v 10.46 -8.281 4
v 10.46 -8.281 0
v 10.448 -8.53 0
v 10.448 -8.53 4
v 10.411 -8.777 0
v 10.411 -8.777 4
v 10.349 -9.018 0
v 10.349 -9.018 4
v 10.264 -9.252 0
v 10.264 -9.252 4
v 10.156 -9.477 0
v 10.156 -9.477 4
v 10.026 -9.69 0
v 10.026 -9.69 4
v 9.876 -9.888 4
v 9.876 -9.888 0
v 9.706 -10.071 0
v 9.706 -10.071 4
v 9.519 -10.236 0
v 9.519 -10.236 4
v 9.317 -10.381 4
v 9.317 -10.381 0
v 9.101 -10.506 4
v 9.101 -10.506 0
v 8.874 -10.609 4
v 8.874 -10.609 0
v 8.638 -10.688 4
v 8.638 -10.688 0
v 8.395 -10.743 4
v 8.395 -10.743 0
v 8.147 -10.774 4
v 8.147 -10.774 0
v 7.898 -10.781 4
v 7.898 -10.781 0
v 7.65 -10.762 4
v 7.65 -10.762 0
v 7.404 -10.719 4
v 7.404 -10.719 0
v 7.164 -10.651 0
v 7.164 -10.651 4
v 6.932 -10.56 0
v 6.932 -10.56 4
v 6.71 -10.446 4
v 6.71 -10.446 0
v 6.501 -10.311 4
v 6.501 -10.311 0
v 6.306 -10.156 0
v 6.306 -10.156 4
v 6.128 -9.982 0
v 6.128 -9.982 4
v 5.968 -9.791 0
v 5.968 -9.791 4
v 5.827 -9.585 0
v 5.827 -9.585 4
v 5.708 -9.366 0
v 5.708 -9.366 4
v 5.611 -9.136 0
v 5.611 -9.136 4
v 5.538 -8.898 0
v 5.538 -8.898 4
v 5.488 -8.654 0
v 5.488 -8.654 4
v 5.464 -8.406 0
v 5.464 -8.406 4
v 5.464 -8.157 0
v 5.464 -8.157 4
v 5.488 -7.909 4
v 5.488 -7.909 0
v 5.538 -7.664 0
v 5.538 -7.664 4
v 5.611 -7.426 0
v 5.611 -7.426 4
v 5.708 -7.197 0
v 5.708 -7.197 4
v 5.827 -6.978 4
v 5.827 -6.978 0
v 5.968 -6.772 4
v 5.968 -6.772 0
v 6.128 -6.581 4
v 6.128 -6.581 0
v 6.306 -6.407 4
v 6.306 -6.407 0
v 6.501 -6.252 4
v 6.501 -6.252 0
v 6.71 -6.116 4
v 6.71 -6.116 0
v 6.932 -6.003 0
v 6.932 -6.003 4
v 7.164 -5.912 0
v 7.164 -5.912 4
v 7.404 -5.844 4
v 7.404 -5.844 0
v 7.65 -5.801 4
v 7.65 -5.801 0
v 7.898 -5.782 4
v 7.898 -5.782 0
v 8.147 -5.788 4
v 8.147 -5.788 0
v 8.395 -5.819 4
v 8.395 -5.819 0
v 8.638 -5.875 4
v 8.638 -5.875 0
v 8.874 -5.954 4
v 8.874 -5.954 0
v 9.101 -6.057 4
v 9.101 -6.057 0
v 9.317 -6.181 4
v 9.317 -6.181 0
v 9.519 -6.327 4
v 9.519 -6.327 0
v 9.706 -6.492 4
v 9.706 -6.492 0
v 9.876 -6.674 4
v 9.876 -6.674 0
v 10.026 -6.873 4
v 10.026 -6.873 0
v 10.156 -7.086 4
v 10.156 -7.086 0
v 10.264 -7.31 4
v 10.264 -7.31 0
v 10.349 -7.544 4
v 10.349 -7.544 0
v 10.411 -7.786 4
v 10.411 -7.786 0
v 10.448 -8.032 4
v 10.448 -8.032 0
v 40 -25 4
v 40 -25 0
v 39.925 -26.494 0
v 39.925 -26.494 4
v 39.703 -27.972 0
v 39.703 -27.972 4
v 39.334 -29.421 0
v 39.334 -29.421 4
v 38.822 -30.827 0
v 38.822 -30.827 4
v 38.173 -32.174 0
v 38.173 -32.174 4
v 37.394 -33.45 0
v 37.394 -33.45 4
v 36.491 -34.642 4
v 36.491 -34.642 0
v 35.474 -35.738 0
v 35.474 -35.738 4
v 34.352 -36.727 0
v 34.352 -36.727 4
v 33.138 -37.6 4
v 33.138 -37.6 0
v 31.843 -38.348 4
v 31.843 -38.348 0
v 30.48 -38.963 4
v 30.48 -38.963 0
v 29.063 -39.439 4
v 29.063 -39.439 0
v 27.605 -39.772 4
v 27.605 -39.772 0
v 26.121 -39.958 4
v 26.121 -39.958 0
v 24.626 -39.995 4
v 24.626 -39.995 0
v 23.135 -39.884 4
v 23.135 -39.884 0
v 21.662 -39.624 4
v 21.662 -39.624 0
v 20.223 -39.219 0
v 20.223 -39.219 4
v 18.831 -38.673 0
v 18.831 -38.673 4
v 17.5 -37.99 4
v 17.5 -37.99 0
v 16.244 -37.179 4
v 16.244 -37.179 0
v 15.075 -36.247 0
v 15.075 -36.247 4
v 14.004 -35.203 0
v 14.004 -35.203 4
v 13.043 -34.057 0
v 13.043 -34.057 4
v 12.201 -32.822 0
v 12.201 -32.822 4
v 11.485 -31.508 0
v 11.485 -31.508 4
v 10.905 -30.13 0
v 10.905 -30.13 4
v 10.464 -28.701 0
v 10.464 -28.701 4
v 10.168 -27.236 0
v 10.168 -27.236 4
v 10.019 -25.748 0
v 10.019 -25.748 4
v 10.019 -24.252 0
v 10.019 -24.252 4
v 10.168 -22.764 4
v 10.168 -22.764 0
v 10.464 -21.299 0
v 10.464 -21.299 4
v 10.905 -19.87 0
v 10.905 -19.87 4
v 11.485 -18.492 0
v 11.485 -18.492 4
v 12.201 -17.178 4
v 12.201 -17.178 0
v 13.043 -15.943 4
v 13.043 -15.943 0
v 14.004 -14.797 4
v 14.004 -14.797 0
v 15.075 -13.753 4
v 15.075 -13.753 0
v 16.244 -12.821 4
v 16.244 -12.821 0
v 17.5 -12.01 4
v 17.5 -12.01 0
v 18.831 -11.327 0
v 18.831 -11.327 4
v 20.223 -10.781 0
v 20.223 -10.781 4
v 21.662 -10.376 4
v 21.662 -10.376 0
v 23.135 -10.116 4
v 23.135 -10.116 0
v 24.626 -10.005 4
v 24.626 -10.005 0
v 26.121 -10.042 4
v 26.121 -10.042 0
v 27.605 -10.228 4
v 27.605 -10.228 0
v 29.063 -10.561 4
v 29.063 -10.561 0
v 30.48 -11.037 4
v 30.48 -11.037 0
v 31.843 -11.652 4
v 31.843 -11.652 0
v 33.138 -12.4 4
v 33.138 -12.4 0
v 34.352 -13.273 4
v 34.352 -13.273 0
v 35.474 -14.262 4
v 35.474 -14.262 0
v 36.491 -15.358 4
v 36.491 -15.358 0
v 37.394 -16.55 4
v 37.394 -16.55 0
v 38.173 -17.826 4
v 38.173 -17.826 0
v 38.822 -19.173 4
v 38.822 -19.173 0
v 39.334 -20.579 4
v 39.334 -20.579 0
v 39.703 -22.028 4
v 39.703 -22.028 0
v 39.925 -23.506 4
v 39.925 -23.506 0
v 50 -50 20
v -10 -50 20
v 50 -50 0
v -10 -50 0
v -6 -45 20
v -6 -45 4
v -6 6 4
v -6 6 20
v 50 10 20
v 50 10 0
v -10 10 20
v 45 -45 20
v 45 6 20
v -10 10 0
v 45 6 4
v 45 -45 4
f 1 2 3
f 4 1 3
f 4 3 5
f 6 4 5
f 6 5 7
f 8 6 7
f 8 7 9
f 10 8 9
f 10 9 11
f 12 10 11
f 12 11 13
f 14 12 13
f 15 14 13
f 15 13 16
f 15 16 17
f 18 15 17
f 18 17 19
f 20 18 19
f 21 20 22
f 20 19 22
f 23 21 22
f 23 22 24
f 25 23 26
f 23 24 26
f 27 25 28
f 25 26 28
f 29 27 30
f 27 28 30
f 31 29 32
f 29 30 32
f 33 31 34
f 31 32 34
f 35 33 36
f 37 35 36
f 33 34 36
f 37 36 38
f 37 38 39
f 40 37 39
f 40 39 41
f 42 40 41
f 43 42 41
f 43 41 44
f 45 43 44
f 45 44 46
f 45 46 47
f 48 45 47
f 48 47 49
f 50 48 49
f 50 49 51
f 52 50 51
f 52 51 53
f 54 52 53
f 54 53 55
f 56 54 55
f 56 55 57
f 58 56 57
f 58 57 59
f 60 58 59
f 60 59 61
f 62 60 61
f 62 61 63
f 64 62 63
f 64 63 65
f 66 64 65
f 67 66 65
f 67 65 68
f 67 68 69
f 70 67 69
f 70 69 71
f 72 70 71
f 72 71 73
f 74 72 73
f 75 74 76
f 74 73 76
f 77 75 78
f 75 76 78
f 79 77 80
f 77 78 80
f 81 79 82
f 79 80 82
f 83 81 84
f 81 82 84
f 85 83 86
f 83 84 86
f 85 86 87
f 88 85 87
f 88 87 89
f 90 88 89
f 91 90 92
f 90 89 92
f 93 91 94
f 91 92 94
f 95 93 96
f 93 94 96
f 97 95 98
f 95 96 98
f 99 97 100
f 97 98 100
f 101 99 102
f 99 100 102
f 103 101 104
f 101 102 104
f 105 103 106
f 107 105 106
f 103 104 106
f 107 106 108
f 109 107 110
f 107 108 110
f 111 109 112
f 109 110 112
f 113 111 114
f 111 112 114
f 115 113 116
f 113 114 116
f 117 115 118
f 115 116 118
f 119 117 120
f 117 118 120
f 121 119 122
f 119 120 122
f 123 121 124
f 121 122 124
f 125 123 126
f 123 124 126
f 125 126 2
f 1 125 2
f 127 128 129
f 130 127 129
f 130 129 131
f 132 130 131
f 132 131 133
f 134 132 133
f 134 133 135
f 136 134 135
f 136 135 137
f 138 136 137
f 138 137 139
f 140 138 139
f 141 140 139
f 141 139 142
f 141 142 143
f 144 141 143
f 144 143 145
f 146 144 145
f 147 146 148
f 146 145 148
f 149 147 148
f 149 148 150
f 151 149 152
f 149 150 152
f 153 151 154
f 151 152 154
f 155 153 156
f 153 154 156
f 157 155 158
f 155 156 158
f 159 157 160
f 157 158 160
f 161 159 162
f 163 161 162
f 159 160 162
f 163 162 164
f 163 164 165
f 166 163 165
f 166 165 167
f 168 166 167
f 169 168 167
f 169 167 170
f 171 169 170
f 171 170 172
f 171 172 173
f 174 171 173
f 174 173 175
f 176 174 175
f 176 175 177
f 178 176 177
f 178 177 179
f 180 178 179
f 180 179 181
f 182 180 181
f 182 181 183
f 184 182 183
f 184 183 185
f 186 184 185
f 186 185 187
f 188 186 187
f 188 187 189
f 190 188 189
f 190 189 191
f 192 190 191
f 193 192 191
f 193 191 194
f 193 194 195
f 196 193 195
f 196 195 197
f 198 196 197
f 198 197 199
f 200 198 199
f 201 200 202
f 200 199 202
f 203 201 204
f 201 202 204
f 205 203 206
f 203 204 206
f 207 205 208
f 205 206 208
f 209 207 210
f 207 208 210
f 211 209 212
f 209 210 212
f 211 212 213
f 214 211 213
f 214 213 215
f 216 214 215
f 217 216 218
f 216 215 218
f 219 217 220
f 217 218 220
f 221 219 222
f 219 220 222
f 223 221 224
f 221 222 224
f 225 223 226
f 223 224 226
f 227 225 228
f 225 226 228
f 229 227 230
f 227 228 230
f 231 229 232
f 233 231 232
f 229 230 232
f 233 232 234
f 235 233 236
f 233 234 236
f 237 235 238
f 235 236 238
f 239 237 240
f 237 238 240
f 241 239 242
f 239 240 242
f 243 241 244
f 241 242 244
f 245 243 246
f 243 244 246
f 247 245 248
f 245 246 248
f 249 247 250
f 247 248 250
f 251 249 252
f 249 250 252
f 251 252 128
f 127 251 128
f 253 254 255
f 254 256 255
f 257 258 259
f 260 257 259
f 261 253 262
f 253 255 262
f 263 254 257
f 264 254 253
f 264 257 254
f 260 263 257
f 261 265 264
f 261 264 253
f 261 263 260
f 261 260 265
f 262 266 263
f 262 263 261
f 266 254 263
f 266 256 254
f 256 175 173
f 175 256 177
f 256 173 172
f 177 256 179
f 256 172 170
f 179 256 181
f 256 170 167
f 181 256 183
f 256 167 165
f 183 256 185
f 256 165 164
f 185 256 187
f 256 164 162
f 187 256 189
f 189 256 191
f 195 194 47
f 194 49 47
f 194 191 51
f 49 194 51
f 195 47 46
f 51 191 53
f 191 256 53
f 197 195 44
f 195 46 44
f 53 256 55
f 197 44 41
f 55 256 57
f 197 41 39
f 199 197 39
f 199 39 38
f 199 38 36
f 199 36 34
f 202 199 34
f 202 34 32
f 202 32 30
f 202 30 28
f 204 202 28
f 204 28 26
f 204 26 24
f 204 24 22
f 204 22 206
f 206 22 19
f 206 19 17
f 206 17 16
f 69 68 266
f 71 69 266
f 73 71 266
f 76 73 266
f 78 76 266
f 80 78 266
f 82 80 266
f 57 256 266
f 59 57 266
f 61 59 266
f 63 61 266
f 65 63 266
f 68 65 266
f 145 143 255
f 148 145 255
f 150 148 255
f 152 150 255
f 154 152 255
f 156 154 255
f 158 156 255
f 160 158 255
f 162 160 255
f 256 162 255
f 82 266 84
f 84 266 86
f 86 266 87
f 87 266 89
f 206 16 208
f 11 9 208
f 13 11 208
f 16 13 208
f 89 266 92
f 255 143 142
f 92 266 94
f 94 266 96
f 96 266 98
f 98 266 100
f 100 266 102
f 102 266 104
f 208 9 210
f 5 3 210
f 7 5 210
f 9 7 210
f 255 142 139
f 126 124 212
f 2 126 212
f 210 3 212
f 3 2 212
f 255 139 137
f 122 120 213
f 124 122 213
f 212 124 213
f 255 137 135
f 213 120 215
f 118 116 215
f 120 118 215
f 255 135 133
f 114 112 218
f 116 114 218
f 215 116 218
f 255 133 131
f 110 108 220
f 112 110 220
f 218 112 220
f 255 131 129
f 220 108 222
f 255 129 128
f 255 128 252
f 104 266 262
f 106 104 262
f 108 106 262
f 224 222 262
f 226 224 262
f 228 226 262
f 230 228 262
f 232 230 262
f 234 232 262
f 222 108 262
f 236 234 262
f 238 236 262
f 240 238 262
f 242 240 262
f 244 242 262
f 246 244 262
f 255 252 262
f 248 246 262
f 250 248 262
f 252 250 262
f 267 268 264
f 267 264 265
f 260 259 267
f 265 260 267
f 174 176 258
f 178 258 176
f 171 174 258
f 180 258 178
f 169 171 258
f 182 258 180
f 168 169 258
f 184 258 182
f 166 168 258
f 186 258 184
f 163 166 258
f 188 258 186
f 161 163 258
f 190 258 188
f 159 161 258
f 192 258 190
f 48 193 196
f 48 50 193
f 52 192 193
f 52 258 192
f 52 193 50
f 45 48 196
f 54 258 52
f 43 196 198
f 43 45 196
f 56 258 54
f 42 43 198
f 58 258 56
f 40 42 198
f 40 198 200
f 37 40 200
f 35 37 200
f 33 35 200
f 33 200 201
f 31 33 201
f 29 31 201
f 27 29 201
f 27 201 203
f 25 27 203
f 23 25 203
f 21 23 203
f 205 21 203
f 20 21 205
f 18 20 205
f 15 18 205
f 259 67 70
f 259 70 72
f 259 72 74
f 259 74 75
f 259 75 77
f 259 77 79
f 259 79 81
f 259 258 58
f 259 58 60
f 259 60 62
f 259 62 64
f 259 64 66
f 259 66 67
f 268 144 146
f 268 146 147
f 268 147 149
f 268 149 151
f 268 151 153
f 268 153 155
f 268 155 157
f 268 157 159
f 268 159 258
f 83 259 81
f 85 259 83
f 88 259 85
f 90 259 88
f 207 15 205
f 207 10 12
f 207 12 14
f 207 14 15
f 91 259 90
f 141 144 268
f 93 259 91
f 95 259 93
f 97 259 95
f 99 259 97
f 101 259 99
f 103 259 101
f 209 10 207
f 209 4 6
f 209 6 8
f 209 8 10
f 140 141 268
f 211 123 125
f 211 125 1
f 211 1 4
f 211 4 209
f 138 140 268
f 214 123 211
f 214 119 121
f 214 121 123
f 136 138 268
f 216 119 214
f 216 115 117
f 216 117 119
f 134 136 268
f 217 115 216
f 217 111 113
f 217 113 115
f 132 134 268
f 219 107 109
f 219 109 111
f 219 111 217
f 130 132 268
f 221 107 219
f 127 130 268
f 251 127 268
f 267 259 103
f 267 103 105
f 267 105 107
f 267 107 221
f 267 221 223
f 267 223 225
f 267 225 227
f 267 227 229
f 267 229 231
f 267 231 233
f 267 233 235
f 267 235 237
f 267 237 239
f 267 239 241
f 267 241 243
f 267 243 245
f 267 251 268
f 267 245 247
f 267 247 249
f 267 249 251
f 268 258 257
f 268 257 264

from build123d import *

# Parameters (mm, degrees)
SKETCH_W        = 60
SKETCH_H        = 60
PAD_DEPTH       = 4
SKETCH001_W     = 60
SKETCH001_H     = 60
SKETCH001_W_2   = 51
SKETCH001_H_2   = 51
PAD001_DEPTH    = 16
SKETCH002_R     = 15
POCKET_DEPTH    = 5
SKETCH003_R     = 2.5
POCKET001_DEPTH = 5


with BuildPart() as part:
    # Sketch → Pad (new body)
    with BuildSketch(Plane.XY):
        with Locations((20, -20)):
            Rectangle(SKETCH_W, SKETCH_H)
    extrude(amount=PAD_DEPTH)

    # Sketch001 (on Face6 of Pad) → Pad001 (join)
    with BuildSketch(Plane.XY.offset(4)):
        with Locations((20, -20)):
            Rectangle(SKETCH001_W, SKETCH001_H)
        with Locations((19.5, -19.5)):
            Rectangle(SKETCH001_W_2, SKETCH001_H_2, mode=Mode.SUBTRACT)
    extrude(amount=PAD001_DEPTH)

    # Sketch002 (on Face4 of Pad001) → Pocket (cut)
    with BuildSketch(Plane(origin=(0, 0, 0), x_dir=(1, 0, 0), z_dir=(0, 0, -1))):
        with Locations((25, 25)):
            Circle(SKETCH002_R)
    extrude(amount=-POCKET_DEPTH, mode=Mode.SUBTRACT)

    # Sketch003 (on Face4 of Pocket) → Pocket001 (cut)
    with BuildSketch(Plane(origin=(0, 0, 0), x_dir=(1, 0, 0), z_dir=(0, 0, -1))):
        with Locations((7.960481, 8.281351)):
            Circle(SKETCH003_R)
    extrude(amount=-POCKET001_DEPTH, mode=Mode.SUBTRACT)


solid = part.part
